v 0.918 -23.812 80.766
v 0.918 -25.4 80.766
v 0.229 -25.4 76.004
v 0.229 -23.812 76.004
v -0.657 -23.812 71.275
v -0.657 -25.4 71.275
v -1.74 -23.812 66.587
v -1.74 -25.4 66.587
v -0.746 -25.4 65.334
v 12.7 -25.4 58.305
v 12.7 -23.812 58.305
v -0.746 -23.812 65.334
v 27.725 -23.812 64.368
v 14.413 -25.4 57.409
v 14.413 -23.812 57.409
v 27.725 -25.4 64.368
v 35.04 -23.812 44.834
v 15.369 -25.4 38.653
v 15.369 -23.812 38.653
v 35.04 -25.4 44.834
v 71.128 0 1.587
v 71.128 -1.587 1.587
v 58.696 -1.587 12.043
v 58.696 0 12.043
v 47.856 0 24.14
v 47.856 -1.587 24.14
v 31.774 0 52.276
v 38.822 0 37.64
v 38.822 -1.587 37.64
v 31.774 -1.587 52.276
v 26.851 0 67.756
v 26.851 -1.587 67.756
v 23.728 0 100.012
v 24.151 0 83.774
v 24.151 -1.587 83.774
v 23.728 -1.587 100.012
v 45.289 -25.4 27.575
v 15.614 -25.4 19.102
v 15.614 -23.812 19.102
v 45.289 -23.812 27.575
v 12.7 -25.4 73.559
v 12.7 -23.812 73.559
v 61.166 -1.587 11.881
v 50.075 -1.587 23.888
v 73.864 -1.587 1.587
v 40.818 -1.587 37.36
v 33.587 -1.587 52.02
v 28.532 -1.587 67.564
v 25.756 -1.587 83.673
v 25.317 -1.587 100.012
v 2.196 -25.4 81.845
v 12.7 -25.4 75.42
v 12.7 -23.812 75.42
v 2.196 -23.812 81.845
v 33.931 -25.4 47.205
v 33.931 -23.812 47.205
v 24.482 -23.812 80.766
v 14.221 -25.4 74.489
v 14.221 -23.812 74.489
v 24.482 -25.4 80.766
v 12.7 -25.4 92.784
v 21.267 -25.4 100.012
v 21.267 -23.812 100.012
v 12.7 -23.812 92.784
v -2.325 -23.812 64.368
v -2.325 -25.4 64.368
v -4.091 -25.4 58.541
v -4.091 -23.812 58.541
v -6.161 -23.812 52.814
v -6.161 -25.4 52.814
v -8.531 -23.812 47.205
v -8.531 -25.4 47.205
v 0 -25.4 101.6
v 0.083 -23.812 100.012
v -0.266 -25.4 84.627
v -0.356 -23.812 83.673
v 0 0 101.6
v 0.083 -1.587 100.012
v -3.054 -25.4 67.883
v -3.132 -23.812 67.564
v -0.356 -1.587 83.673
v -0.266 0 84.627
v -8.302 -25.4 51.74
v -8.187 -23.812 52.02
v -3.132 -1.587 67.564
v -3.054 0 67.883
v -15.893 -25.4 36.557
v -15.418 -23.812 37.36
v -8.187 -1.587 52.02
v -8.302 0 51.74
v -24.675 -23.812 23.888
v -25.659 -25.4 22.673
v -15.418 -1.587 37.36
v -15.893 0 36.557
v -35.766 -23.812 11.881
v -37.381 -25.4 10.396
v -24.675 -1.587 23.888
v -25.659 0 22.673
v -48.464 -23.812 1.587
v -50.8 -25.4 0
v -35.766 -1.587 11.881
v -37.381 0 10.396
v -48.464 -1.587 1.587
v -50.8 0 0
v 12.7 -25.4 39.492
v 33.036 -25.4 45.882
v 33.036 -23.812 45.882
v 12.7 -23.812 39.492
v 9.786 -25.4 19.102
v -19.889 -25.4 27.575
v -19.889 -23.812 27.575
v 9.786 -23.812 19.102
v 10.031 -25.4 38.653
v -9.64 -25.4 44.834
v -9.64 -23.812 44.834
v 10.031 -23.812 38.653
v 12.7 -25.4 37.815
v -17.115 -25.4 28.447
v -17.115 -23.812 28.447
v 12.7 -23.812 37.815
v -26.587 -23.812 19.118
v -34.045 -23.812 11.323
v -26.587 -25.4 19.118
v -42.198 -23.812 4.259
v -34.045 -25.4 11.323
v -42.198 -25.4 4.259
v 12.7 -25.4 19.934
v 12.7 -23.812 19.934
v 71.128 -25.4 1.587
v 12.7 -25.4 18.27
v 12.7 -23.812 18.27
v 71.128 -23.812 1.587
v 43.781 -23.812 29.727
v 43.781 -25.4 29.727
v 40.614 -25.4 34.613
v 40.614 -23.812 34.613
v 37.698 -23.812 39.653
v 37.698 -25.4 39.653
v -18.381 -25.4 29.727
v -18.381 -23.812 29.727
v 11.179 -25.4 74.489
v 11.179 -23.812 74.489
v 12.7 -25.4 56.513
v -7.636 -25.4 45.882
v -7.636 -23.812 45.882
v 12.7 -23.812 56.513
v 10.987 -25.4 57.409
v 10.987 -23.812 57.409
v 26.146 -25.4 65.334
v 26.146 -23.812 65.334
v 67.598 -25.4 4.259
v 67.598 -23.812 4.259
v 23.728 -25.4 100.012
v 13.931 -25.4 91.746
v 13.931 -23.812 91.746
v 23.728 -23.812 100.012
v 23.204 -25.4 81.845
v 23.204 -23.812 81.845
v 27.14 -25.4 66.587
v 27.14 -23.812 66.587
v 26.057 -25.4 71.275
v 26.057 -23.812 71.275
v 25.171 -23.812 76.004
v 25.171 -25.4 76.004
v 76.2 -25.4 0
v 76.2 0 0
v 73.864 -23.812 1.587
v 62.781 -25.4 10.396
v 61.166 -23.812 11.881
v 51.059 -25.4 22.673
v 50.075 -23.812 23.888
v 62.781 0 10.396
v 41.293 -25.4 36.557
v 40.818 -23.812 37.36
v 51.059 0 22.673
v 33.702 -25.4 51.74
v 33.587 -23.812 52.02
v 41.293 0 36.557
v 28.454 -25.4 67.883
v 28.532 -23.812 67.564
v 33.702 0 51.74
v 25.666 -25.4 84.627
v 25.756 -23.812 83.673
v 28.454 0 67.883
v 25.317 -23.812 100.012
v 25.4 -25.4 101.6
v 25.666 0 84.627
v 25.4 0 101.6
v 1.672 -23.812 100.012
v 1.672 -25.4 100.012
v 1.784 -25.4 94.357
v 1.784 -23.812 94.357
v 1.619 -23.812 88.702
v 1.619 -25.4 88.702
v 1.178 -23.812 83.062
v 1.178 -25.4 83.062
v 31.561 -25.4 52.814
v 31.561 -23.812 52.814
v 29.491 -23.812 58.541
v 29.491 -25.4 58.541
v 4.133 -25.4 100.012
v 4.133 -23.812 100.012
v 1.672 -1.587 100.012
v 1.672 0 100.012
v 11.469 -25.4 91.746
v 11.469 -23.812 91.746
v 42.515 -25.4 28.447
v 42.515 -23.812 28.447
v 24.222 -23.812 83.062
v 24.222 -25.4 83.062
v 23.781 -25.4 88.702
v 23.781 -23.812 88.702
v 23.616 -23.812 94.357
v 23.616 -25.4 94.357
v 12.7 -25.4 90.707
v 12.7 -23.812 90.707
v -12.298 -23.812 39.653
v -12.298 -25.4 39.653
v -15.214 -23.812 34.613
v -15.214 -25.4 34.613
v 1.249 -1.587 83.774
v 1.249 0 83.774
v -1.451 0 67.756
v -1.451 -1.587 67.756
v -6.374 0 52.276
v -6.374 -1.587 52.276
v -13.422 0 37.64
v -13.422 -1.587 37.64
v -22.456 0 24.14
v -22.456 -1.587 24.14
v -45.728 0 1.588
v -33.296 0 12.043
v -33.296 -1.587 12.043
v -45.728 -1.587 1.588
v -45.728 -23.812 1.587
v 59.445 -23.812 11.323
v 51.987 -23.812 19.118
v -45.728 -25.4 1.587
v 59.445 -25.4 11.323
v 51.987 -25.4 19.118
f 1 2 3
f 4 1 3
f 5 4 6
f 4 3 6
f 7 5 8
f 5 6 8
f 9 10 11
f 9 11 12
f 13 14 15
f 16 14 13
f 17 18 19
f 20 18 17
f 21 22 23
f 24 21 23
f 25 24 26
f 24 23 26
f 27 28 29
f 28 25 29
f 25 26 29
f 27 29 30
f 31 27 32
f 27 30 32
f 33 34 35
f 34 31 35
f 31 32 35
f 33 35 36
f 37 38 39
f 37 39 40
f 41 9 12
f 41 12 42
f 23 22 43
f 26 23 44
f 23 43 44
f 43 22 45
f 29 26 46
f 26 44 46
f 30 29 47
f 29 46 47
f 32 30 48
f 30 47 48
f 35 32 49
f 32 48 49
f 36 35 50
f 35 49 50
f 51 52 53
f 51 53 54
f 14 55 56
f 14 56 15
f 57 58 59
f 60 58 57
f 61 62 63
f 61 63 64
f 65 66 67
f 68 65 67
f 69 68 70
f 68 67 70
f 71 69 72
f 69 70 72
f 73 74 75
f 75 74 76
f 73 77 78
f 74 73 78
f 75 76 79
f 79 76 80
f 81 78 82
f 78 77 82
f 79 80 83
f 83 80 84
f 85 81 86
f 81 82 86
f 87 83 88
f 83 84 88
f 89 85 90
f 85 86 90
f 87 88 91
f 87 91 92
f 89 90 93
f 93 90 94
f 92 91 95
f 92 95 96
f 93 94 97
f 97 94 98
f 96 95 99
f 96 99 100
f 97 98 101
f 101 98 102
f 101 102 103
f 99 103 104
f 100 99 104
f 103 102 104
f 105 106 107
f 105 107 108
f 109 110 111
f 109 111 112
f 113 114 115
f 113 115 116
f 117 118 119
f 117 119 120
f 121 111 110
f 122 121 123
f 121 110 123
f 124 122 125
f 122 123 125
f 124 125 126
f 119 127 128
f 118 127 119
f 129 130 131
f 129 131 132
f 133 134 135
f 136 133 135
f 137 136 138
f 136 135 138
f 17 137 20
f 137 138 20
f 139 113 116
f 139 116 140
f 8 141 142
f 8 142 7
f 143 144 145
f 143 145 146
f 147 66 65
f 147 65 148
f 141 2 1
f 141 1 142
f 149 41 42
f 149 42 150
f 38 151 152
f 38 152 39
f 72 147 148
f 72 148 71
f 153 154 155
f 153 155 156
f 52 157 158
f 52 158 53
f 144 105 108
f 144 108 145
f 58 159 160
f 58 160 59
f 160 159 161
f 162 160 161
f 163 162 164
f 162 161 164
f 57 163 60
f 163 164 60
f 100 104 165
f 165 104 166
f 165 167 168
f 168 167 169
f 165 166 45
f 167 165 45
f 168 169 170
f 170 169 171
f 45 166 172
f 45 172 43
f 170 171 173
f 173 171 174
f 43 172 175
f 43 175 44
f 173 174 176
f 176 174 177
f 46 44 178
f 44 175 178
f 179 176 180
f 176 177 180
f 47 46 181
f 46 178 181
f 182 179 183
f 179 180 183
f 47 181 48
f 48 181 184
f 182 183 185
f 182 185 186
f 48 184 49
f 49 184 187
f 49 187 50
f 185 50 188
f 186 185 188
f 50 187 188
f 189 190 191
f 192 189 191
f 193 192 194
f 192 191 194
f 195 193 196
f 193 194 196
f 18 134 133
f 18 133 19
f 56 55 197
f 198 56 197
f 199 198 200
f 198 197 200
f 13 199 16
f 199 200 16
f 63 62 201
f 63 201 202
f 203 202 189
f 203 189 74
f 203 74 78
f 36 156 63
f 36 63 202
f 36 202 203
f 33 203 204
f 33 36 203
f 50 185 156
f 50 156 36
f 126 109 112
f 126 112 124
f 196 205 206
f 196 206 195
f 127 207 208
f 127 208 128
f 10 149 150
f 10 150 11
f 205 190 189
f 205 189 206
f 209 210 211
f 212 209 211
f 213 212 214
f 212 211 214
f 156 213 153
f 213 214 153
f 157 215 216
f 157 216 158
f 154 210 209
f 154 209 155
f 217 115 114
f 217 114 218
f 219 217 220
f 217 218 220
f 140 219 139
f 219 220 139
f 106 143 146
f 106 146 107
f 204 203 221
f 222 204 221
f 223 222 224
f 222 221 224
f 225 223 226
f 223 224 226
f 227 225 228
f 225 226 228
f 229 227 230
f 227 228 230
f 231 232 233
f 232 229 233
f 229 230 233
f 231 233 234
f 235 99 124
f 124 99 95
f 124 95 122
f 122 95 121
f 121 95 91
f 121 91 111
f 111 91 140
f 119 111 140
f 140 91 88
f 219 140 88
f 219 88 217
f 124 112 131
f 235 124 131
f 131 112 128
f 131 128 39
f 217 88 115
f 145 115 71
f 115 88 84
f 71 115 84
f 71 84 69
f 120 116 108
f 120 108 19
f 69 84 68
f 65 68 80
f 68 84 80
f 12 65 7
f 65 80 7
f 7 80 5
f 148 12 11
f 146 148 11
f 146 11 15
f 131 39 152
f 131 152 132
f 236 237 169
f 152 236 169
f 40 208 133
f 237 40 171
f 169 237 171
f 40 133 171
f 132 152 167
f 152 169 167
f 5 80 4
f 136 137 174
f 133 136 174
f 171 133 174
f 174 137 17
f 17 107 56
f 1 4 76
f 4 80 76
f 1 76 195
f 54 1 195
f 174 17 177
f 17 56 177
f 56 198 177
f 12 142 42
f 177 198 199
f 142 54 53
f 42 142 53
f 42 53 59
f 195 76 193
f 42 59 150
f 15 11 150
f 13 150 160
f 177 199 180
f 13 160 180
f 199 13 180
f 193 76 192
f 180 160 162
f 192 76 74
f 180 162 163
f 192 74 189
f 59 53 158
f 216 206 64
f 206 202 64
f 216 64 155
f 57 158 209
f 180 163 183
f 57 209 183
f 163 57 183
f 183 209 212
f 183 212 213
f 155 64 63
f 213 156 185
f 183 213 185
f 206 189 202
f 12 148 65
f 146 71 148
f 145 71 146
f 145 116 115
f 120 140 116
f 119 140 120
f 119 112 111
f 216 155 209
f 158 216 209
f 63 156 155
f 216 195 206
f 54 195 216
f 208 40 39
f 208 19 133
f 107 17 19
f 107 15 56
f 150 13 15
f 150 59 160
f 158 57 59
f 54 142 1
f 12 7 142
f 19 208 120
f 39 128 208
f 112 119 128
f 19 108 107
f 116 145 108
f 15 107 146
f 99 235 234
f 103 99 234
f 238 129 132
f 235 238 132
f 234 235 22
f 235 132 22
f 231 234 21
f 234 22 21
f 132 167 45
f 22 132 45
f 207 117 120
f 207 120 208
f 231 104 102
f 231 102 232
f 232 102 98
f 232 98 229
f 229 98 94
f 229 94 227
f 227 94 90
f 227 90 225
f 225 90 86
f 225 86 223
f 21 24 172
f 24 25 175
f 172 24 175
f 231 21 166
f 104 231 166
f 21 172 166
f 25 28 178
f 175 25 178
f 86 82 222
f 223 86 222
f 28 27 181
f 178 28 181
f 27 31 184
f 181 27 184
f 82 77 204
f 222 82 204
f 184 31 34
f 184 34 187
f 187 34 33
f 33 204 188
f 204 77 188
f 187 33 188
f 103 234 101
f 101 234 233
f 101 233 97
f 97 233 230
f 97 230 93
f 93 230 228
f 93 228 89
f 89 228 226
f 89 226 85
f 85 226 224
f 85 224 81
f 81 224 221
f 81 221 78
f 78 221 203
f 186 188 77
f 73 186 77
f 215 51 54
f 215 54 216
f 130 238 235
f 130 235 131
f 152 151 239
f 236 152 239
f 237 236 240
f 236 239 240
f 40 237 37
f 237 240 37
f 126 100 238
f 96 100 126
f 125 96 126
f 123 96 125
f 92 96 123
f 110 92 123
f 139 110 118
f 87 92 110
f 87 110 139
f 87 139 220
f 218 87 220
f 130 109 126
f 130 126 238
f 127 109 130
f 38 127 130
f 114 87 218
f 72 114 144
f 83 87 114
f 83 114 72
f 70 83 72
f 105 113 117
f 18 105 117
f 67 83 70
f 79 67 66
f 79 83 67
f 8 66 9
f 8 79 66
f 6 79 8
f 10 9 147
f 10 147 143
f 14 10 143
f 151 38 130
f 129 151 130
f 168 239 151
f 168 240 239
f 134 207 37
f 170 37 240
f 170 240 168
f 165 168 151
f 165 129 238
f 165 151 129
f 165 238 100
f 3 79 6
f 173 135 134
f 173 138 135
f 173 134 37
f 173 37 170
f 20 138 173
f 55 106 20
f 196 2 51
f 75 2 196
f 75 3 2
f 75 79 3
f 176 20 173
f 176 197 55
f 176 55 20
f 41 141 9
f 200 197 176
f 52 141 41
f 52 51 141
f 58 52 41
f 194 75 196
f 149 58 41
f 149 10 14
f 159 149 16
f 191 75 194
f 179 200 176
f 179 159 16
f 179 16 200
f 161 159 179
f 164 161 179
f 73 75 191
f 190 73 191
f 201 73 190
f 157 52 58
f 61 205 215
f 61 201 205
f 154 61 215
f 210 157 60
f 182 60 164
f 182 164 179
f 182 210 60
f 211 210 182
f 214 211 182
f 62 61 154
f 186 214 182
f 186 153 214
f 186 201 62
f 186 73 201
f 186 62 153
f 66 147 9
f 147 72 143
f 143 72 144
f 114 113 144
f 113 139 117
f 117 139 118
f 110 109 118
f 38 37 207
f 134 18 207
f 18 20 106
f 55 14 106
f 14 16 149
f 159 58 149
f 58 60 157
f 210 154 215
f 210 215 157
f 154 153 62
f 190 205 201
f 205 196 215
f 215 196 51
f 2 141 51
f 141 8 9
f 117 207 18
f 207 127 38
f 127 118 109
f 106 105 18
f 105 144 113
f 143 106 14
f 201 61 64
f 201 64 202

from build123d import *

# Parameters (mm, degrees)
F1_DEPTH = 25.4
F3_DEPTH = 25.401
F5_W     = 22.225
F5_H     = 98.425
F6_DEPTH = 134.621
F8_DEPTH = 1.5875


with BuildPart() as f1:
    # F0 (on Front) → F1 (new body)
    with BuildSketch(Plane.XZ):
        with BuildLine():
            Line((12.7, 101.6), (12.7, 0))
            Line((12.7, 0), (76.2, 0))
            ThreePointArc((76.2, 0), (37.2138180159, 44.0069090079), (25.4, 101.6))
            Line((25.4, 101.6), (12.7, 101.6))
        make_face()
        with BuildLine():
            Line((-50.8, 0), (12.7, 0))
            Line((12.7, 0), (12.7, 101.6))
            Line((12.7, 101.6), (0, 101.6))
            ThreePointArc((0, 101.6), (-11.8138180159, 44.0069090079), (-50.8, 0))
        make_face()
    extrude(amount=F1_DEPTH)

    # F2 (on face) → F3 (cut, through all)
    with BuildSketch(Plane.XZ.offset(25.4)):
        with BuildLine():
            ThreePointArc((71.1283228984, 1.5875), (35.0396824726, 44.8338255614), (23.7282488961, 100.0125))
            Line((23.7282488961, 100.0125), (1.6717511039, 100.0125))
            ThreePointArc((1.6717511039, 100.0125), (-9.6396824726, 44.8338255614), (-45.7283228984, 1.5875))
            Line((-45.7283228984, 1.5875), (71.1283228984, 1.5875))
        make_face()
    extrude(amount=-F3_DEPTH, mode=Mode.SUBTRACT)

    # F5 (on offset) → F6 (cut, through all)
    with BuildSketch(Plane.YZ.offset(83.82)):
        with Locations((-12.7, 50.8)):
            Rectangle(F5_W, F5_H)
    extrude(amount=-F6_DEPTH, mode=Mode.SUBTRACT)

    # F7 (on face) → F8 (join)
    with BuildSketch(Plane.XZ.offset(25.4)):
        with BuildLine():
            Line((13.9308617211, 91.7459002665), (23.7282488961, 100.0125))
            Line((23.7282488961, 100.0125), (21.2665254539, 100.0125))
            Line((21.2665254539, 100.0125), (12.7, 92.784446666))
            Line((12.7, 92.784446666), (12.7, 90.7073538669))
            Line((12.7, 90.7073538669), (23.203703887, 81.8447954927))
            Line((23.203703887, 81.8447954927), (12.7, 75.4199183699))
            Line((12.7, 75.4199183699), (12.7, 73.5589856846))
            Line((12.7, 73.5589856846), (14.2211719622, 74.4894520272))
            Line((14.2211719622, 74.4894520272), (24.4823150631, 80.7659602259))
            ThreePointArc((24.4823150631, 80.7659602259), (24.3465871841, 81.9135246636), (24.2223606039, 83.0623910408))
            Line((24.2223606039, 83.0623910408), (13.9308617211, 91.7459002665))
        make_face()
        with BuildLine():
            Line((12.7, 90.7073538669), (12.7, 92.784446666))
            Line((12.7, 92.784446666), (4.1334745461, 100.0125))
            Line((4.1334745461, 100.0125), (1.6717511039, 100.0125))
            Line((1.6717511039, 100.0125), (11.4691382789, 91.7459002665))
            Line((11.4691382789, 91.7459002665), (1.1776393961, 83.0623910408))
            ThreePointArc((1.1776393961, 83.0623910408), (1.0534128159, 81.9135246636), (0.9176849369, 80.7659602259))
            Line((0.9176849369, 80.7659602259), (11.1788280378, 74.4894520272))
            Line((11.1788280378, 74.4894520272), (-1.7401008163, 66.5872366432))
            ThreePointArc((-1.7401008163, 66.5872366432), (-1.8224554679, 66.2637756063), (-1.9057456257, 65.9405541952))
            Line((-1.9057456257, 65.9405541952), (-0.7461259732, 65.3342957957))
            Line((-0.7461259732, 65.3342957957), (12.7, 73.5589856846))
            Line((12.7, 73.5589856846), (12.7, 75.4199183699))
            Line((12.7, 75.4199183699), (2.196296113, 81.8447954927))
            Line((2.196296113, 81.8447954927), (12.7, 90.7073538669))
        make_face()
        with BuildLine():
            Line((27.1401008163, 66.5872366432), (14.2211719622, 74.4894520272))
            Line((14.2211719622, 74.4894520272), (12.7, 73.5589856846))
            Line((12.7, 73.5589856846), (26.1461259732, 65.3342957957))
            Line((26.1461259732, 65.3342957957), (27.3057456257, 65.9405541952))
            ThreePointArc((27.3057456257, 65.9405541952), (27.2224554679, 66.2637756063), (27.1401008163, 66.5872366432))
        make_face()
        with BuildLine():
            Line((12.7, 56.5131896629), (12.7, 58.3045539367))
            Line((12.7, 58.3045539367), (-0.7461259732, 65.3342957957))
            Line((-0.7461259732, 65.3342957957), (-2.3251365904, 64.3684508614))
            Line((-2.3251365904, 64.3684508614), (10.9867856194, 57.4088717998))
            Line((10.9867856194, 57.4088717998), (-8.5307429304, 47.204952269))
            ThreePointArc((-8.5307429304, 47.204952269), (-8.7388685778, 46.7490885521), (-8.9489724475, 46.2941331944))
            Line((-8.9489724475, 46.2941331944), (-7.6357223304, 45.8815119005))
            Line((-7.6357223304, 45.8815119005), (12.7, 56.5131896629))
        make_face()
        with BuildLine():
            Line((26.1461259732, 65.3342957957), (12.7, 58.3045539367))
            Line((12.7, 58.3045539367), (12.7, 56.5131896629))
            Line((12.7, 56.5131896629), (33.0357223304, 45.8815119005))
            Line((33.0357223304, 45.8815119005), (34.3489724475, 46.2941331944))
            ThreePointArc((34.3489724475, 46.2941331944), (34.1388685778, 46.7490885521), (33.9307429304, 47.204952269))
            Line((33.9307429304, 47.204952269), (14.4132143806, 57.4088717998))
            Line((14.4132143806, 57.4088717998), (27.7251365904, 64.3684508614))
            Line((27.7251365904, 64.3684508614), (26.1461259732, 65.3342957957))
        make_face()
        with BuildLine():
            Line((12.7, 37.8147295273), (12.7, 39.4920572546))
            Line((12.7, 39.4920572546), (-7.6357223304, 45.8815119005))
            Line((-7.6357223304, 45.8815119005), (-9.6396824726, 44.8338255614))
            Line((-9.6396824726, 44.8338255614), (10.030783861, 38.653393391))
            Line((10.030783861, 38.653393391), (-18.3805162111, 29.7266038582))
            ThreePointArc((-18.3805162111, 29.7266038582), (-18.6444962244, 29.3426124449), (-18.9100250772, 28.9596904146))
            Line((-18.9100250772, 28.9596904146), (-17.1145505748, 28.4470407091))
            Line((-17.1145505748, 28.4470407091), (12.7, 37.8147295273))
        make_face()
        with BuildLine():
            Line((33.0357223304, 45.8815119005), (12.7, 39.4920572546))
            Line((12.7, 39.4920572546), (12.7, 37.8147295273))
            Line((12.7, 37.8147295273), (42.5145505748, 28.4470407091))
            Line((42.5145505748, 28.4470407091), (44.3100250772, 28.9596904146))
            ThreePointArc((44.3100250772, 28.9596904146), (44.0444962244, 29.3426124449), (43.7805162111, 29.7266038582))
            Line((43.7805162111, 29.7266038582), (15.369216139, 38.653393391))
            Line((15.369216139, 38.653393391), (35.0396824726, 44.8338255614))
            Line((35.0396824726, 44.8338255614), (33.0357223304, 45.8815119005))
        make_face()
        with BuildLine():
            Line((42.5145505748, 28.4470407091), (12.7, 19.9342934931))
            Line((12.7, 19.9342934931), (12.7, 18.2701443298))
            Line((12.7, 18.2701443298), (71.1283228984, 1.5875))
            ThreePointArc((71.1283228984, 1.5875), (69.3505916333, 2.9065647427), (67.5984969335, 4.2594965256))
            Line((67.5984969335, 4.2594965256), (15.6142096044, 19.1022189114))
            Line((15.6142096044, 19.1022189114), (45.2894191126, 27.575181014))
            Line((45.2894191126, 27.575181014), (42.5145505748, 28.4470407091))
        make_face()
        with BuildLine():
            Line((12.7, 18.2701443298), (12.7, 19.9342934931))
            Line((12.7, 19.9342934931), (-17.1145505748, 28.4470407091))
            Line((-17.1145505748, 28.4470407091), (-19.8894191126, 27.575181014))
            Line((-19.8894191126, 27.575181014), (9.7857903956, 19.1022189114))
            Line((9.7857903956, 19.1022189114), (-42.1984969335, 4.2594965256))
            ThreePointArc((-42.1984969335, 4.2594965256), (-43.9505916333, 2.9065647427), (-45.7283228984, 1.5875))
            Line((-45.7283228984, 1.5875), (12.7, 18.2701443298))
        make_face()
        with BuildLine():
            Line((-19.8894191126, 27.575181014), (-17.1145505748, 28.4470407091))
            Line((-17.1145505748, 28.4470407091), (-18.9100250772, 28.9596904146))
            ThreePointArc((-18.9100250772, 28.9596904146), (-19.3971779809, 28.2656360226), (-19.8894191126, 27.575181014))
        make_face()
        with BuildLine():
            Line((34.3489724475, 46.2941331944), (33.0357223304, 45.8815119005))
            Line((33.0357223304, 45.8815119005), (35.0396824726, 44.8338255614))
            ThreePointArc((35.0396824726, 44.8338255614), (34.6917714104, 45.5627703936), (34.3489724475, 46.2941331944))
        make_face()
        with BuildLine():
            Line((44.3100250772, 28.9596904146), (42.5145505748, 28.4470407091))
            Line((42.5145505748, 28.4470407091), (45.2894191126, 27.575181014))
            ThreePointArc((45.2894191126, 27.575181014), (44.7971779809, 28.2656360226), (44.3100250772, 28.9596904146))
        make_face()
        with BuildLine():
            Line((-9.6396824726, 44.8338255614), (-7.6357223304, 45.8815119005))
            Line((-7.6357223304, 45.8815119005), (-8.9489724475, 46.2941331944))
            ThreePointArc((-8.9489724475, 46.2941331944), (-9.2917714104, 45.5627703936), (-9.6396824726, 44.8338255614))
        make_face()
        with BuildLine():
            ThreePointArc((27.7251365904, 64.3684508614), (27.5126695085, 65.153763147), (27.3057456257, 65.9405541952))
            Line((27.3057456257, 65.9405541952), (26.1461259732, 65.3342957957))
            Line((26.1461259732, 65.3342957957), (27.7251365904, 64.3684508614))
        make_face()
        with BuildLine():
            Line((-2.3251365904, 64.3684508614), (-0.7461259732, 65.3342957957))
            Line((-0.7461259732, 65.3342957957), (-1.9057456257, 65.9405541952))
            ThreePointArc((-1.9057456257, 65.9405541952), (-2.1126695085, 65.153763147), (-2.3251365904, 64.3684508614))
        make_face()
    extrude(amount=-F8_DEPTH)


solid = f1.part
